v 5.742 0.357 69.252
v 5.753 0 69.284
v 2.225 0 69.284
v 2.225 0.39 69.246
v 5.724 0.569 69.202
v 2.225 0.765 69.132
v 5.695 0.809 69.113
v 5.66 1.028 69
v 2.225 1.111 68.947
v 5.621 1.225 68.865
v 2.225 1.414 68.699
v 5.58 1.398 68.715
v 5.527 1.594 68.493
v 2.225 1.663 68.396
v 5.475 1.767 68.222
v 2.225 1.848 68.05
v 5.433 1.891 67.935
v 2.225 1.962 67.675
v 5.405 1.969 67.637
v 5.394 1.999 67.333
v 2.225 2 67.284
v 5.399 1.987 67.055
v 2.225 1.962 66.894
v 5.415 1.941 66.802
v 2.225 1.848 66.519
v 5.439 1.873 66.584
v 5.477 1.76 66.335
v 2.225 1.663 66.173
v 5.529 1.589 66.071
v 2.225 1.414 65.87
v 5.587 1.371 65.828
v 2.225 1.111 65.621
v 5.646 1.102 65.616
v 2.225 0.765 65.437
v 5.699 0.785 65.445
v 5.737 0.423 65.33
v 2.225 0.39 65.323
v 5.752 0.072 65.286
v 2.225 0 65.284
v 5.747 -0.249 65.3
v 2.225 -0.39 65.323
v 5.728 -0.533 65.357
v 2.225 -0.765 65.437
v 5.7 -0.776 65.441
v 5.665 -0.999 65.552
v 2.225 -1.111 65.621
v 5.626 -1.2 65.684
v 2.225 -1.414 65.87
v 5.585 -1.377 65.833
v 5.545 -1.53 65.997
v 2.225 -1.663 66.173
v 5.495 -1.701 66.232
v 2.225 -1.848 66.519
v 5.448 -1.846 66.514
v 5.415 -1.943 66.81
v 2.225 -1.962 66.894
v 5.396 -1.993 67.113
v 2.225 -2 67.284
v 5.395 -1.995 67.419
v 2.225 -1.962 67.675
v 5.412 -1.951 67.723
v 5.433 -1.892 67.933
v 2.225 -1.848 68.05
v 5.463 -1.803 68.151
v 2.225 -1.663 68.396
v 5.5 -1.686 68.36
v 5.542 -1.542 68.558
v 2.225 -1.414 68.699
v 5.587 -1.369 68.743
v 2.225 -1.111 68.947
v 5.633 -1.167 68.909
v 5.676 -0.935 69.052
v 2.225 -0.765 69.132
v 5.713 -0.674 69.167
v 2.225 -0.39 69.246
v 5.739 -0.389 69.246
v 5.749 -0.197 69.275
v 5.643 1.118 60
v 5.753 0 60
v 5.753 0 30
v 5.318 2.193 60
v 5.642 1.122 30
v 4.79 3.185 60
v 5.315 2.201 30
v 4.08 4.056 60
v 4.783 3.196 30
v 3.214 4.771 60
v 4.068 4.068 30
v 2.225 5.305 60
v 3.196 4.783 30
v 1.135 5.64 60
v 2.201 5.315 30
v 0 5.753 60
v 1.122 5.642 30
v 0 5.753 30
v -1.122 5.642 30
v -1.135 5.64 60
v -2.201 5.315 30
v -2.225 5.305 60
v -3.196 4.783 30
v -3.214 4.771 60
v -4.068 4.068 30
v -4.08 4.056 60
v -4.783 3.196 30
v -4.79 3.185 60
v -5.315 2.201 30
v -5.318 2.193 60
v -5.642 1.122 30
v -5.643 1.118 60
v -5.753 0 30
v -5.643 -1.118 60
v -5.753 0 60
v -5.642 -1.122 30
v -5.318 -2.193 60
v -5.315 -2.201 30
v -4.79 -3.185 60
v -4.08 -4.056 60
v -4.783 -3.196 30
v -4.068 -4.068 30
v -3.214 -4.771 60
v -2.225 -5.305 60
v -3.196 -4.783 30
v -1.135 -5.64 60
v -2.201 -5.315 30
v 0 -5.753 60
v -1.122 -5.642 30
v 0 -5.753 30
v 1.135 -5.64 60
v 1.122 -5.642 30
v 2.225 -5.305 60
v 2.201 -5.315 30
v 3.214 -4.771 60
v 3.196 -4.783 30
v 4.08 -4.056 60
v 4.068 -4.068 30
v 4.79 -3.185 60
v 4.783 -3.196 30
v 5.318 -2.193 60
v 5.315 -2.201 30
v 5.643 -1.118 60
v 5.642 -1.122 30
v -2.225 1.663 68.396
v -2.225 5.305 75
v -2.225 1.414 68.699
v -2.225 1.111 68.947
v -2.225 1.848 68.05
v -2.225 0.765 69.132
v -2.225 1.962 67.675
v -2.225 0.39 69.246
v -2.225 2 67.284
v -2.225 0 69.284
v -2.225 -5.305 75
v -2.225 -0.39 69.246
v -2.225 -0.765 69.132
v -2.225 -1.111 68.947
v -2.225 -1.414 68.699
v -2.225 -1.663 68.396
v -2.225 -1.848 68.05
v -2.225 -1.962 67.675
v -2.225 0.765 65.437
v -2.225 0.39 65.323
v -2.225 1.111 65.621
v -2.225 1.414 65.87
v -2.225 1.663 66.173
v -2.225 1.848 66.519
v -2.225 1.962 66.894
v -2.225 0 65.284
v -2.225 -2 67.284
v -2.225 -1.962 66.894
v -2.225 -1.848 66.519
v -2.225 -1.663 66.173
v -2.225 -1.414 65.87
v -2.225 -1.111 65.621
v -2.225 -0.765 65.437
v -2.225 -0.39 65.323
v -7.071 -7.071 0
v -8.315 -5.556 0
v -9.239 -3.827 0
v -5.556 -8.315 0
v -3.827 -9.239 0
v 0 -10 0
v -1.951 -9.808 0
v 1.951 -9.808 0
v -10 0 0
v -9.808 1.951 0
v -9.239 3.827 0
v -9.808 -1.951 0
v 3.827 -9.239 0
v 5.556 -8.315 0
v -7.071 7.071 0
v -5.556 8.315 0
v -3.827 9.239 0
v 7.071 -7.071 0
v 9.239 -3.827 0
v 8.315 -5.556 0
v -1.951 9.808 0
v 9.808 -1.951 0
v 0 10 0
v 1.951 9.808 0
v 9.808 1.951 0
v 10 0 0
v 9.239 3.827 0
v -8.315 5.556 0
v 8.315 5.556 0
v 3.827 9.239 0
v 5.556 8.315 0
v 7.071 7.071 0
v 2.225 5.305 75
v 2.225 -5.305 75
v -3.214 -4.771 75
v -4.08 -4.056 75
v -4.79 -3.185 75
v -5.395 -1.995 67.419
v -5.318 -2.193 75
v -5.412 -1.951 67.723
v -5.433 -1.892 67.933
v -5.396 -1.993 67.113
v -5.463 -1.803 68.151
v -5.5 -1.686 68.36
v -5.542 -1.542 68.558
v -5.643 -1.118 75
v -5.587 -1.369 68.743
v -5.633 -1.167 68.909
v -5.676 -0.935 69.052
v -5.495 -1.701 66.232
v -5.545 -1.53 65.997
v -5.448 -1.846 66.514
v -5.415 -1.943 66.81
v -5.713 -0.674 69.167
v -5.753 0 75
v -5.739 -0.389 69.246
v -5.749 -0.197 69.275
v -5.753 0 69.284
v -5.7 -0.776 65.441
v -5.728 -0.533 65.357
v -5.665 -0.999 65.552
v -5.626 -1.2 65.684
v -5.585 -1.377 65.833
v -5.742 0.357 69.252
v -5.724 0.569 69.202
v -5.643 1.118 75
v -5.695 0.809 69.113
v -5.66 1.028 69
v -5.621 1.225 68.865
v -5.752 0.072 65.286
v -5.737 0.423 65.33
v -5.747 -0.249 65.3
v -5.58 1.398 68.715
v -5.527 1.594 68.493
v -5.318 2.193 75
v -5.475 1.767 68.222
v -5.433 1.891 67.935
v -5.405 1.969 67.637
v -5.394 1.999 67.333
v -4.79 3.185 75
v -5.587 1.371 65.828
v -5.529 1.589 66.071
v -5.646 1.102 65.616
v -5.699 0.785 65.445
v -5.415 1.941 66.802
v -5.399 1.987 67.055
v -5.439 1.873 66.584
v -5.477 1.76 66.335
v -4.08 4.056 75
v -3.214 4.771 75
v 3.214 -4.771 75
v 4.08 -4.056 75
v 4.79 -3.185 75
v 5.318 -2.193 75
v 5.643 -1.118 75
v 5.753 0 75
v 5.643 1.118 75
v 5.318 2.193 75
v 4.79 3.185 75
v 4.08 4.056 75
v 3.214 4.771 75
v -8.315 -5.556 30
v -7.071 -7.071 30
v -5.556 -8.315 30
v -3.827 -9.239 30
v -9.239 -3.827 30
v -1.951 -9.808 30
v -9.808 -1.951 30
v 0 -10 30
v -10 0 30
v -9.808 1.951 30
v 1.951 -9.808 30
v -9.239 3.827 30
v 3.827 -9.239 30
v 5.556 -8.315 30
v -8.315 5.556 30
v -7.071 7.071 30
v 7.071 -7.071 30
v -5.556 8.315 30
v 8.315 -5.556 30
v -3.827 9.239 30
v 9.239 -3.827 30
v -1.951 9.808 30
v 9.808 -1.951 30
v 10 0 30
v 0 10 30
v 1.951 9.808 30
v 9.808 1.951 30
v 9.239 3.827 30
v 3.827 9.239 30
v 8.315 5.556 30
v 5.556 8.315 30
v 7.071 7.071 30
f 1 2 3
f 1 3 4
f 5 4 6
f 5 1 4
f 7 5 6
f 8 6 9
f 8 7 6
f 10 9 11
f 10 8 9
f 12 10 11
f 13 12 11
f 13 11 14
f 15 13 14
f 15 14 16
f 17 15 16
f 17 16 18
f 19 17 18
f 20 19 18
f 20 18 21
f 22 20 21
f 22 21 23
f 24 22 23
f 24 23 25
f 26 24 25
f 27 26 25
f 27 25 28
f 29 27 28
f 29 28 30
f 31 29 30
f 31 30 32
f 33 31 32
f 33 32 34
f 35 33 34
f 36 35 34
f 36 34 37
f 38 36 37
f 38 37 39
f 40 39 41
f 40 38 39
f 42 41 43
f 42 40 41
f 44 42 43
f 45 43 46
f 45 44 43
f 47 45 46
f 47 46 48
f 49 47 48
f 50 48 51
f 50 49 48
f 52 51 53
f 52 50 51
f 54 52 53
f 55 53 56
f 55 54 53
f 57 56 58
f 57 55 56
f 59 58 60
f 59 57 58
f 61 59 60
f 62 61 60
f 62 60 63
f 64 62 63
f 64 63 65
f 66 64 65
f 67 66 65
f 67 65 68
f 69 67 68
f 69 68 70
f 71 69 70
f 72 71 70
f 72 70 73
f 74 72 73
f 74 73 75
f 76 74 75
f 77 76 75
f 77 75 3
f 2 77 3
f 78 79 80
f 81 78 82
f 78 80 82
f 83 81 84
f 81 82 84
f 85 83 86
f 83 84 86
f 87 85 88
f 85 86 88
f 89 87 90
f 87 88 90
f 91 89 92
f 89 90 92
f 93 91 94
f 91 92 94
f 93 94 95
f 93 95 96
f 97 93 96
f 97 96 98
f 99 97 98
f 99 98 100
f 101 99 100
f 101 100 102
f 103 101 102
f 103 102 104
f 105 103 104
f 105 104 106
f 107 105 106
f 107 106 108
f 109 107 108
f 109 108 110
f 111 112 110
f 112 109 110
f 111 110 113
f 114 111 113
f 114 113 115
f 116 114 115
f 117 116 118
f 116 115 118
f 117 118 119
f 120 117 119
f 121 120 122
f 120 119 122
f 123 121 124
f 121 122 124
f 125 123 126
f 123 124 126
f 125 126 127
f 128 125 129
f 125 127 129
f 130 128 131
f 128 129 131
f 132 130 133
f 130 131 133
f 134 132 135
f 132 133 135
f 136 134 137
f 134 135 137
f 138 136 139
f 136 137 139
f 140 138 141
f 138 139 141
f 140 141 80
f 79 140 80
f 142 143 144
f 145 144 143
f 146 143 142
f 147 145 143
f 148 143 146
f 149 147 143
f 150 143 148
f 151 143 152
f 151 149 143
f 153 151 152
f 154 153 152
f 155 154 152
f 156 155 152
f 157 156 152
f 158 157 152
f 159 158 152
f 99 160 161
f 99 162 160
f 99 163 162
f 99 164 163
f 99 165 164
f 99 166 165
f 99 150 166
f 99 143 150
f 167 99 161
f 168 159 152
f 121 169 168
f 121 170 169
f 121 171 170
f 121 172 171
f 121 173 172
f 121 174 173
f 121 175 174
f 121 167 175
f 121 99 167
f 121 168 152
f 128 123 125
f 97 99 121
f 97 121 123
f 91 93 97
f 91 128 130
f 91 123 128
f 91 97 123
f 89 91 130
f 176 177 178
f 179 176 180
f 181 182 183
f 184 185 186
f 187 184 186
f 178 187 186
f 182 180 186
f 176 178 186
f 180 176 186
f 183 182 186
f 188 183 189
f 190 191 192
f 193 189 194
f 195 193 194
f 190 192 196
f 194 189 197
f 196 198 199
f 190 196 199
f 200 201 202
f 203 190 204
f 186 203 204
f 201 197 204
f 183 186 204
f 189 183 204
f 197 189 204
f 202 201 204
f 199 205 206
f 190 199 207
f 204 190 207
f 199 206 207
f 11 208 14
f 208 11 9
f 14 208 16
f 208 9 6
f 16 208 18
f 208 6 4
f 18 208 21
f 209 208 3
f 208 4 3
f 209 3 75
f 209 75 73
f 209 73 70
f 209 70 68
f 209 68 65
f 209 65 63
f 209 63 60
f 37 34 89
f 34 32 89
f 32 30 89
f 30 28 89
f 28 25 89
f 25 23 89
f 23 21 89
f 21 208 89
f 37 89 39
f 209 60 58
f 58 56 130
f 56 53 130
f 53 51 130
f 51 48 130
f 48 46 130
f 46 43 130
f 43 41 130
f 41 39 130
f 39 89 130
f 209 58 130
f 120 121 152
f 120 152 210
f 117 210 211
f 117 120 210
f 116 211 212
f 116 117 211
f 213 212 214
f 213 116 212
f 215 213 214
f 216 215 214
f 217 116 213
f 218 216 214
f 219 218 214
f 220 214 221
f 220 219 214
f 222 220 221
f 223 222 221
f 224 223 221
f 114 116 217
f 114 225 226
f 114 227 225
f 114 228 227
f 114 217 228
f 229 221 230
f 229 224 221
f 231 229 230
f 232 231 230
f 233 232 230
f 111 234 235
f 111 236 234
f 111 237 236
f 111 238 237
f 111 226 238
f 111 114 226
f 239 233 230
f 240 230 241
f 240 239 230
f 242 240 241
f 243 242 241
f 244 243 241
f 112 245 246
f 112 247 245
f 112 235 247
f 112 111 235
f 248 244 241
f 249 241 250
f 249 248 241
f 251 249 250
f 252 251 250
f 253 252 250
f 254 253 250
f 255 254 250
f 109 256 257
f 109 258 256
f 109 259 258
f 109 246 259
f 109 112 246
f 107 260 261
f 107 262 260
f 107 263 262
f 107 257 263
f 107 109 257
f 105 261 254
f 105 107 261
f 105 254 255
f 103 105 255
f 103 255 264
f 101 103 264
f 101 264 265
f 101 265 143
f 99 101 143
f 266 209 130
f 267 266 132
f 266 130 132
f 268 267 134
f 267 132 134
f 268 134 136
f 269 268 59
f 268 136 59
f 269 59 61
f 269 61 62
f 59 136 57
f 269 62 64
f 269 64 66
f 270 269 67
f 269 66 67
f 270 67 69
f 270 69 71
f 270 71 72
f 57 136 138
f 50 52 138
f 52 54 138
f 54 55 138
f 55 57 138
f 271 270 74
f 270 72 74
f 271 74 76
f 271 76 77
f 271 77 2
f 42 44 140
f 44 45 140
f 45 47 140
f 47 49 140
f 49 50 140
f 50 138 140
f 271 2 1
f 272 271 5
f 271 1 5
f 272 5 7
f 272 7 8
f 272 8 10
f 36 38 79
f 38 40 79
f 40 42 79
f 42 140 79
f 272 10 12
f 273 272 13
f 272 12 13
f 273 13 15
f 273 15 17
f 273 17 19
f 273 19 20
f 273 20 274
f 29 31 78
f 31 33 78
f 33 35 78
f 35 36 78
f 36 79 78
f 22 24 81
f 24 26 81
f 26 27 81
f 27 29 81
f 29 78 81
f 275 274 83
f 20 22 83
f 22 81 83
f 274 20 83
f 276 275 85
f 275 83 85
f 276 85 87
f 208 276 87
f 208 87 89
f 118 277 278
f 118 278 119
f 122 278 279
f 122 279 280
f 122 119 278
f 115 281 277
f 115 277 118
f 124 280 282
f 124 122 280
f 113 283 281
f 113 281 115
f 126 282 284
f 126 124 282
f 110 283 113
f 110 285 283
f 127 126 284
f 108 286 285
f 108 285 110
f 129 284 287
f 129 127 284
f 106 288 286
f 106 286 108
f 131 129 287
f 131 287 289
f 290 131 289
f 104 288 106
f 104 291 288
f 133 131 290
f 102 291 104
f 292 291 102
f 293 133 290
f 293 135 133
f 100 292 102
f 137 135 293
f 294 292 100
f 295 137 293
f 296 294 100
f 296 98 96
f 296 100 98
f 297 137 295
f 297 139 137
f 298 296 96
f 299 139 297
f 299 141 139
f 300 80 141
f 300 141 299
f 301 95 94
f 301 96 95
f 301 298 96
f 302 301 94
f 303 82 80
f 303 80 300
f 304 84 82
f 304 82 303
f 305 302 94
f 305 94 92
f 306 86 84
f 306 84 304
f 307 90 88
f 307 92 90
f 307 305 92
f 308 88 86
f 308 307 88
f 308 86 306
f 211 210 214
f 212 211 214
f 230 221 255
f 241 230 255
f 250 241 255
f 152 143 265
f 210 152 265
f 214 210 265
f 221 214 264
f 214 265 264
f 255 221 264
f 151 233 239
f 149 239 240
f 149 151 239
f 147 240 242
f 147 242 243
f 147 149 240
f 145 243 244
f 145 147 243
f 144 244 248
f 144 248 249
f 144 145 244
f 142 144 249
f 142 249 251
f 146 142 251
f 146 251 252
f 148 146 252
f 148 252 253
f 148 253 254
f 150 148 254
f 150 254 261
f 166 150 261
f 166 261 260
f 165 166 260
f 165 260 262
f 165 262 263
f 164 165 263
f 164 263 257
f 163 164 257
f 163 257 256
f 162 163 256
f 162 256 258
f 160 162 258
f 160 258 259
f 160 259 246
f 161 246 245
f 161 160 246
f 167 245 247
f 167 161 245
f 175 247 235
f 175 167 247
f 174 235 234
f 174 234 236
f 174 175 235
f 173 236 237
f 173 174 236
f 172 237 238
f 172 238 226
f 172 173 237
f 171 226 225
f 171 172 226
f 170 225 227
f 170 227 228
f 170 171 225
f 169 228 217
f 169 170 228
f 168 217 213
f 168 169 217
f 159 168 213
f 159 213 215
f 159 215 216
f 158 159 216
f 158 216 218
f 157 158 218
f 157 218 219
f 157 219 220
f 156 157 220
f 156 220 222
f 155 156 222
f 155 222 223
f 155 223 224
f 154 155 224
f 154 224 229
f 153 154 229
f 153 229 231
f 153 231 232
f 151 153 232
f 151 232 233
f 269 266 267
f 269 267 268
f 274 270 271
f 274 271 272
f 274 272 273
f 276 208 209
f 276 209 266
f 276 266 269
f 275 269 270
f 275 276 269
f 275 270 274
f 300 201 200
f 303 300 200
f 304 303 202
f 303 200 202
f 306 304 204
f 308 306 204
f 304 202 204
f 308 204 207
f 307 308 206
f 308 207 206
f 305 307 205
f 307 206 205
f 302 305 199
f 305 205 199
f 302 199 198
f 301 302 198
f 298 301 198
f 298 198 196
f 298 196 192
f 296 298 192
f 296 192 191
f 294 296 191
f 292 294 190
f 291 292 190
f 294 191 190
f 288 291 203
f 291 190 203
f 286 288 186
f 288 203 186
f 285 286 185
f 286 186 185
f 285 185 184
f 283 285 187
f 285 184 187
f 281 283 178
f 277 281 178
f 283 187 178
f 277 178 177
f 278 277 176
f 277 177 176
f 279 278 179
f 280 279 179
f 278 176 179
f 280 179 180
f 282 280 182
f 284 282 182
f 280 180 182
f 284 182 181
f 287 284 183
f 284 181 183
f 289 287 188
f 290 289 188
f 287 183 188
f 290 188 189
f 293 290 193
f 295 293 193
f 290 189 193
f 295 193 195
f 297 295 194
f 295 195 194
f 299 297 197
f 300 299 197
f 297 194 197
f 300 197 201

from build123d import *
from build123d.topology import SkipClean

# Parameters (mm, degrees)
ESQUISSE1_R                  = 10
BOSS_EXTRU_1_DEPTH           = 30
ESQUISSE2_R                  = 5.752589483
BOSS_EXTRU_2_DEPTH           = 30
BOSS_EXTRU_3_DEPTH           = 15
ENL_V_MAT_EXTRU_1_DEPTH      = 77.645000637
ENL_V_MAT_EXTRU_1_DEPTH_BACK = 77.645000637
ESQUISSE4_R                  = 2


with BuildPart() as part:
    # Esquisse1 → Boss.-Extru.1 (new body)
    with BuildSketch(Plane.XY):
        Circle(ESQUISSE1_R)
    extrude(amount=BOSS_EXTRU_1_DEPTH)

    # Esquisse2 → Boss.-Extru.2 (add)
    with BuildSketch(Plane.XY.offset(30)):
        Circle(ESQUISSE2_R)
    extrude(amount=BOSS_EXTRU_2_DEPTH)

    # Esquisse3 → Boss.-Extru.3 (add)
    with SkipClean():  # the faces are left unmerged after this step: merging them gives an invalid solid
        with BuildSketch(Plane.XY.offset(60)):
            with BuildLine():
                Line((-2.225224852, 5.304777104), (-2.225224852, -5.304777104))
                ThreePointArc((-2.225224852, -5.304777104), (-5.752589483, 0), (-2.225224852, 5.304777104))
            make_face()
            with BuildLine():
                Line((2.225224852, 5.304777104), (2.225224852, -5.304777104))
                ThreePointArc((2.225224852, -5.304777104), (5.752589483, 0), (2.225224852, 5.304777104))
            make_face()
        extrude(amount=BOSS_EXTRU_3_DEPTH)

    # Esquisse4 → Enlèv. mat.-Extru.1 (cut, two sides: drawn at the far end of the back side and taken through both)
    with SkipClean():  # the faces are left unmerged after this step: merging them gives an invalid solid
        with BuildSketch(Plane.ZY.offset(-2.225224852).offset(-ENL_V_MAT_EXTRU_1_DEPTH_BACK)):
            with Locations((67.284392663, 0)):
                Circle(ESQUISSE4_R)
        extrude(amount=ENL_V_MAT_EXTRU_1_DEPTH + ENL_V_MAT_EXTRU_1_DEPTH_BACK, mode=Mode.SUBTRACT)


solid = part.part
